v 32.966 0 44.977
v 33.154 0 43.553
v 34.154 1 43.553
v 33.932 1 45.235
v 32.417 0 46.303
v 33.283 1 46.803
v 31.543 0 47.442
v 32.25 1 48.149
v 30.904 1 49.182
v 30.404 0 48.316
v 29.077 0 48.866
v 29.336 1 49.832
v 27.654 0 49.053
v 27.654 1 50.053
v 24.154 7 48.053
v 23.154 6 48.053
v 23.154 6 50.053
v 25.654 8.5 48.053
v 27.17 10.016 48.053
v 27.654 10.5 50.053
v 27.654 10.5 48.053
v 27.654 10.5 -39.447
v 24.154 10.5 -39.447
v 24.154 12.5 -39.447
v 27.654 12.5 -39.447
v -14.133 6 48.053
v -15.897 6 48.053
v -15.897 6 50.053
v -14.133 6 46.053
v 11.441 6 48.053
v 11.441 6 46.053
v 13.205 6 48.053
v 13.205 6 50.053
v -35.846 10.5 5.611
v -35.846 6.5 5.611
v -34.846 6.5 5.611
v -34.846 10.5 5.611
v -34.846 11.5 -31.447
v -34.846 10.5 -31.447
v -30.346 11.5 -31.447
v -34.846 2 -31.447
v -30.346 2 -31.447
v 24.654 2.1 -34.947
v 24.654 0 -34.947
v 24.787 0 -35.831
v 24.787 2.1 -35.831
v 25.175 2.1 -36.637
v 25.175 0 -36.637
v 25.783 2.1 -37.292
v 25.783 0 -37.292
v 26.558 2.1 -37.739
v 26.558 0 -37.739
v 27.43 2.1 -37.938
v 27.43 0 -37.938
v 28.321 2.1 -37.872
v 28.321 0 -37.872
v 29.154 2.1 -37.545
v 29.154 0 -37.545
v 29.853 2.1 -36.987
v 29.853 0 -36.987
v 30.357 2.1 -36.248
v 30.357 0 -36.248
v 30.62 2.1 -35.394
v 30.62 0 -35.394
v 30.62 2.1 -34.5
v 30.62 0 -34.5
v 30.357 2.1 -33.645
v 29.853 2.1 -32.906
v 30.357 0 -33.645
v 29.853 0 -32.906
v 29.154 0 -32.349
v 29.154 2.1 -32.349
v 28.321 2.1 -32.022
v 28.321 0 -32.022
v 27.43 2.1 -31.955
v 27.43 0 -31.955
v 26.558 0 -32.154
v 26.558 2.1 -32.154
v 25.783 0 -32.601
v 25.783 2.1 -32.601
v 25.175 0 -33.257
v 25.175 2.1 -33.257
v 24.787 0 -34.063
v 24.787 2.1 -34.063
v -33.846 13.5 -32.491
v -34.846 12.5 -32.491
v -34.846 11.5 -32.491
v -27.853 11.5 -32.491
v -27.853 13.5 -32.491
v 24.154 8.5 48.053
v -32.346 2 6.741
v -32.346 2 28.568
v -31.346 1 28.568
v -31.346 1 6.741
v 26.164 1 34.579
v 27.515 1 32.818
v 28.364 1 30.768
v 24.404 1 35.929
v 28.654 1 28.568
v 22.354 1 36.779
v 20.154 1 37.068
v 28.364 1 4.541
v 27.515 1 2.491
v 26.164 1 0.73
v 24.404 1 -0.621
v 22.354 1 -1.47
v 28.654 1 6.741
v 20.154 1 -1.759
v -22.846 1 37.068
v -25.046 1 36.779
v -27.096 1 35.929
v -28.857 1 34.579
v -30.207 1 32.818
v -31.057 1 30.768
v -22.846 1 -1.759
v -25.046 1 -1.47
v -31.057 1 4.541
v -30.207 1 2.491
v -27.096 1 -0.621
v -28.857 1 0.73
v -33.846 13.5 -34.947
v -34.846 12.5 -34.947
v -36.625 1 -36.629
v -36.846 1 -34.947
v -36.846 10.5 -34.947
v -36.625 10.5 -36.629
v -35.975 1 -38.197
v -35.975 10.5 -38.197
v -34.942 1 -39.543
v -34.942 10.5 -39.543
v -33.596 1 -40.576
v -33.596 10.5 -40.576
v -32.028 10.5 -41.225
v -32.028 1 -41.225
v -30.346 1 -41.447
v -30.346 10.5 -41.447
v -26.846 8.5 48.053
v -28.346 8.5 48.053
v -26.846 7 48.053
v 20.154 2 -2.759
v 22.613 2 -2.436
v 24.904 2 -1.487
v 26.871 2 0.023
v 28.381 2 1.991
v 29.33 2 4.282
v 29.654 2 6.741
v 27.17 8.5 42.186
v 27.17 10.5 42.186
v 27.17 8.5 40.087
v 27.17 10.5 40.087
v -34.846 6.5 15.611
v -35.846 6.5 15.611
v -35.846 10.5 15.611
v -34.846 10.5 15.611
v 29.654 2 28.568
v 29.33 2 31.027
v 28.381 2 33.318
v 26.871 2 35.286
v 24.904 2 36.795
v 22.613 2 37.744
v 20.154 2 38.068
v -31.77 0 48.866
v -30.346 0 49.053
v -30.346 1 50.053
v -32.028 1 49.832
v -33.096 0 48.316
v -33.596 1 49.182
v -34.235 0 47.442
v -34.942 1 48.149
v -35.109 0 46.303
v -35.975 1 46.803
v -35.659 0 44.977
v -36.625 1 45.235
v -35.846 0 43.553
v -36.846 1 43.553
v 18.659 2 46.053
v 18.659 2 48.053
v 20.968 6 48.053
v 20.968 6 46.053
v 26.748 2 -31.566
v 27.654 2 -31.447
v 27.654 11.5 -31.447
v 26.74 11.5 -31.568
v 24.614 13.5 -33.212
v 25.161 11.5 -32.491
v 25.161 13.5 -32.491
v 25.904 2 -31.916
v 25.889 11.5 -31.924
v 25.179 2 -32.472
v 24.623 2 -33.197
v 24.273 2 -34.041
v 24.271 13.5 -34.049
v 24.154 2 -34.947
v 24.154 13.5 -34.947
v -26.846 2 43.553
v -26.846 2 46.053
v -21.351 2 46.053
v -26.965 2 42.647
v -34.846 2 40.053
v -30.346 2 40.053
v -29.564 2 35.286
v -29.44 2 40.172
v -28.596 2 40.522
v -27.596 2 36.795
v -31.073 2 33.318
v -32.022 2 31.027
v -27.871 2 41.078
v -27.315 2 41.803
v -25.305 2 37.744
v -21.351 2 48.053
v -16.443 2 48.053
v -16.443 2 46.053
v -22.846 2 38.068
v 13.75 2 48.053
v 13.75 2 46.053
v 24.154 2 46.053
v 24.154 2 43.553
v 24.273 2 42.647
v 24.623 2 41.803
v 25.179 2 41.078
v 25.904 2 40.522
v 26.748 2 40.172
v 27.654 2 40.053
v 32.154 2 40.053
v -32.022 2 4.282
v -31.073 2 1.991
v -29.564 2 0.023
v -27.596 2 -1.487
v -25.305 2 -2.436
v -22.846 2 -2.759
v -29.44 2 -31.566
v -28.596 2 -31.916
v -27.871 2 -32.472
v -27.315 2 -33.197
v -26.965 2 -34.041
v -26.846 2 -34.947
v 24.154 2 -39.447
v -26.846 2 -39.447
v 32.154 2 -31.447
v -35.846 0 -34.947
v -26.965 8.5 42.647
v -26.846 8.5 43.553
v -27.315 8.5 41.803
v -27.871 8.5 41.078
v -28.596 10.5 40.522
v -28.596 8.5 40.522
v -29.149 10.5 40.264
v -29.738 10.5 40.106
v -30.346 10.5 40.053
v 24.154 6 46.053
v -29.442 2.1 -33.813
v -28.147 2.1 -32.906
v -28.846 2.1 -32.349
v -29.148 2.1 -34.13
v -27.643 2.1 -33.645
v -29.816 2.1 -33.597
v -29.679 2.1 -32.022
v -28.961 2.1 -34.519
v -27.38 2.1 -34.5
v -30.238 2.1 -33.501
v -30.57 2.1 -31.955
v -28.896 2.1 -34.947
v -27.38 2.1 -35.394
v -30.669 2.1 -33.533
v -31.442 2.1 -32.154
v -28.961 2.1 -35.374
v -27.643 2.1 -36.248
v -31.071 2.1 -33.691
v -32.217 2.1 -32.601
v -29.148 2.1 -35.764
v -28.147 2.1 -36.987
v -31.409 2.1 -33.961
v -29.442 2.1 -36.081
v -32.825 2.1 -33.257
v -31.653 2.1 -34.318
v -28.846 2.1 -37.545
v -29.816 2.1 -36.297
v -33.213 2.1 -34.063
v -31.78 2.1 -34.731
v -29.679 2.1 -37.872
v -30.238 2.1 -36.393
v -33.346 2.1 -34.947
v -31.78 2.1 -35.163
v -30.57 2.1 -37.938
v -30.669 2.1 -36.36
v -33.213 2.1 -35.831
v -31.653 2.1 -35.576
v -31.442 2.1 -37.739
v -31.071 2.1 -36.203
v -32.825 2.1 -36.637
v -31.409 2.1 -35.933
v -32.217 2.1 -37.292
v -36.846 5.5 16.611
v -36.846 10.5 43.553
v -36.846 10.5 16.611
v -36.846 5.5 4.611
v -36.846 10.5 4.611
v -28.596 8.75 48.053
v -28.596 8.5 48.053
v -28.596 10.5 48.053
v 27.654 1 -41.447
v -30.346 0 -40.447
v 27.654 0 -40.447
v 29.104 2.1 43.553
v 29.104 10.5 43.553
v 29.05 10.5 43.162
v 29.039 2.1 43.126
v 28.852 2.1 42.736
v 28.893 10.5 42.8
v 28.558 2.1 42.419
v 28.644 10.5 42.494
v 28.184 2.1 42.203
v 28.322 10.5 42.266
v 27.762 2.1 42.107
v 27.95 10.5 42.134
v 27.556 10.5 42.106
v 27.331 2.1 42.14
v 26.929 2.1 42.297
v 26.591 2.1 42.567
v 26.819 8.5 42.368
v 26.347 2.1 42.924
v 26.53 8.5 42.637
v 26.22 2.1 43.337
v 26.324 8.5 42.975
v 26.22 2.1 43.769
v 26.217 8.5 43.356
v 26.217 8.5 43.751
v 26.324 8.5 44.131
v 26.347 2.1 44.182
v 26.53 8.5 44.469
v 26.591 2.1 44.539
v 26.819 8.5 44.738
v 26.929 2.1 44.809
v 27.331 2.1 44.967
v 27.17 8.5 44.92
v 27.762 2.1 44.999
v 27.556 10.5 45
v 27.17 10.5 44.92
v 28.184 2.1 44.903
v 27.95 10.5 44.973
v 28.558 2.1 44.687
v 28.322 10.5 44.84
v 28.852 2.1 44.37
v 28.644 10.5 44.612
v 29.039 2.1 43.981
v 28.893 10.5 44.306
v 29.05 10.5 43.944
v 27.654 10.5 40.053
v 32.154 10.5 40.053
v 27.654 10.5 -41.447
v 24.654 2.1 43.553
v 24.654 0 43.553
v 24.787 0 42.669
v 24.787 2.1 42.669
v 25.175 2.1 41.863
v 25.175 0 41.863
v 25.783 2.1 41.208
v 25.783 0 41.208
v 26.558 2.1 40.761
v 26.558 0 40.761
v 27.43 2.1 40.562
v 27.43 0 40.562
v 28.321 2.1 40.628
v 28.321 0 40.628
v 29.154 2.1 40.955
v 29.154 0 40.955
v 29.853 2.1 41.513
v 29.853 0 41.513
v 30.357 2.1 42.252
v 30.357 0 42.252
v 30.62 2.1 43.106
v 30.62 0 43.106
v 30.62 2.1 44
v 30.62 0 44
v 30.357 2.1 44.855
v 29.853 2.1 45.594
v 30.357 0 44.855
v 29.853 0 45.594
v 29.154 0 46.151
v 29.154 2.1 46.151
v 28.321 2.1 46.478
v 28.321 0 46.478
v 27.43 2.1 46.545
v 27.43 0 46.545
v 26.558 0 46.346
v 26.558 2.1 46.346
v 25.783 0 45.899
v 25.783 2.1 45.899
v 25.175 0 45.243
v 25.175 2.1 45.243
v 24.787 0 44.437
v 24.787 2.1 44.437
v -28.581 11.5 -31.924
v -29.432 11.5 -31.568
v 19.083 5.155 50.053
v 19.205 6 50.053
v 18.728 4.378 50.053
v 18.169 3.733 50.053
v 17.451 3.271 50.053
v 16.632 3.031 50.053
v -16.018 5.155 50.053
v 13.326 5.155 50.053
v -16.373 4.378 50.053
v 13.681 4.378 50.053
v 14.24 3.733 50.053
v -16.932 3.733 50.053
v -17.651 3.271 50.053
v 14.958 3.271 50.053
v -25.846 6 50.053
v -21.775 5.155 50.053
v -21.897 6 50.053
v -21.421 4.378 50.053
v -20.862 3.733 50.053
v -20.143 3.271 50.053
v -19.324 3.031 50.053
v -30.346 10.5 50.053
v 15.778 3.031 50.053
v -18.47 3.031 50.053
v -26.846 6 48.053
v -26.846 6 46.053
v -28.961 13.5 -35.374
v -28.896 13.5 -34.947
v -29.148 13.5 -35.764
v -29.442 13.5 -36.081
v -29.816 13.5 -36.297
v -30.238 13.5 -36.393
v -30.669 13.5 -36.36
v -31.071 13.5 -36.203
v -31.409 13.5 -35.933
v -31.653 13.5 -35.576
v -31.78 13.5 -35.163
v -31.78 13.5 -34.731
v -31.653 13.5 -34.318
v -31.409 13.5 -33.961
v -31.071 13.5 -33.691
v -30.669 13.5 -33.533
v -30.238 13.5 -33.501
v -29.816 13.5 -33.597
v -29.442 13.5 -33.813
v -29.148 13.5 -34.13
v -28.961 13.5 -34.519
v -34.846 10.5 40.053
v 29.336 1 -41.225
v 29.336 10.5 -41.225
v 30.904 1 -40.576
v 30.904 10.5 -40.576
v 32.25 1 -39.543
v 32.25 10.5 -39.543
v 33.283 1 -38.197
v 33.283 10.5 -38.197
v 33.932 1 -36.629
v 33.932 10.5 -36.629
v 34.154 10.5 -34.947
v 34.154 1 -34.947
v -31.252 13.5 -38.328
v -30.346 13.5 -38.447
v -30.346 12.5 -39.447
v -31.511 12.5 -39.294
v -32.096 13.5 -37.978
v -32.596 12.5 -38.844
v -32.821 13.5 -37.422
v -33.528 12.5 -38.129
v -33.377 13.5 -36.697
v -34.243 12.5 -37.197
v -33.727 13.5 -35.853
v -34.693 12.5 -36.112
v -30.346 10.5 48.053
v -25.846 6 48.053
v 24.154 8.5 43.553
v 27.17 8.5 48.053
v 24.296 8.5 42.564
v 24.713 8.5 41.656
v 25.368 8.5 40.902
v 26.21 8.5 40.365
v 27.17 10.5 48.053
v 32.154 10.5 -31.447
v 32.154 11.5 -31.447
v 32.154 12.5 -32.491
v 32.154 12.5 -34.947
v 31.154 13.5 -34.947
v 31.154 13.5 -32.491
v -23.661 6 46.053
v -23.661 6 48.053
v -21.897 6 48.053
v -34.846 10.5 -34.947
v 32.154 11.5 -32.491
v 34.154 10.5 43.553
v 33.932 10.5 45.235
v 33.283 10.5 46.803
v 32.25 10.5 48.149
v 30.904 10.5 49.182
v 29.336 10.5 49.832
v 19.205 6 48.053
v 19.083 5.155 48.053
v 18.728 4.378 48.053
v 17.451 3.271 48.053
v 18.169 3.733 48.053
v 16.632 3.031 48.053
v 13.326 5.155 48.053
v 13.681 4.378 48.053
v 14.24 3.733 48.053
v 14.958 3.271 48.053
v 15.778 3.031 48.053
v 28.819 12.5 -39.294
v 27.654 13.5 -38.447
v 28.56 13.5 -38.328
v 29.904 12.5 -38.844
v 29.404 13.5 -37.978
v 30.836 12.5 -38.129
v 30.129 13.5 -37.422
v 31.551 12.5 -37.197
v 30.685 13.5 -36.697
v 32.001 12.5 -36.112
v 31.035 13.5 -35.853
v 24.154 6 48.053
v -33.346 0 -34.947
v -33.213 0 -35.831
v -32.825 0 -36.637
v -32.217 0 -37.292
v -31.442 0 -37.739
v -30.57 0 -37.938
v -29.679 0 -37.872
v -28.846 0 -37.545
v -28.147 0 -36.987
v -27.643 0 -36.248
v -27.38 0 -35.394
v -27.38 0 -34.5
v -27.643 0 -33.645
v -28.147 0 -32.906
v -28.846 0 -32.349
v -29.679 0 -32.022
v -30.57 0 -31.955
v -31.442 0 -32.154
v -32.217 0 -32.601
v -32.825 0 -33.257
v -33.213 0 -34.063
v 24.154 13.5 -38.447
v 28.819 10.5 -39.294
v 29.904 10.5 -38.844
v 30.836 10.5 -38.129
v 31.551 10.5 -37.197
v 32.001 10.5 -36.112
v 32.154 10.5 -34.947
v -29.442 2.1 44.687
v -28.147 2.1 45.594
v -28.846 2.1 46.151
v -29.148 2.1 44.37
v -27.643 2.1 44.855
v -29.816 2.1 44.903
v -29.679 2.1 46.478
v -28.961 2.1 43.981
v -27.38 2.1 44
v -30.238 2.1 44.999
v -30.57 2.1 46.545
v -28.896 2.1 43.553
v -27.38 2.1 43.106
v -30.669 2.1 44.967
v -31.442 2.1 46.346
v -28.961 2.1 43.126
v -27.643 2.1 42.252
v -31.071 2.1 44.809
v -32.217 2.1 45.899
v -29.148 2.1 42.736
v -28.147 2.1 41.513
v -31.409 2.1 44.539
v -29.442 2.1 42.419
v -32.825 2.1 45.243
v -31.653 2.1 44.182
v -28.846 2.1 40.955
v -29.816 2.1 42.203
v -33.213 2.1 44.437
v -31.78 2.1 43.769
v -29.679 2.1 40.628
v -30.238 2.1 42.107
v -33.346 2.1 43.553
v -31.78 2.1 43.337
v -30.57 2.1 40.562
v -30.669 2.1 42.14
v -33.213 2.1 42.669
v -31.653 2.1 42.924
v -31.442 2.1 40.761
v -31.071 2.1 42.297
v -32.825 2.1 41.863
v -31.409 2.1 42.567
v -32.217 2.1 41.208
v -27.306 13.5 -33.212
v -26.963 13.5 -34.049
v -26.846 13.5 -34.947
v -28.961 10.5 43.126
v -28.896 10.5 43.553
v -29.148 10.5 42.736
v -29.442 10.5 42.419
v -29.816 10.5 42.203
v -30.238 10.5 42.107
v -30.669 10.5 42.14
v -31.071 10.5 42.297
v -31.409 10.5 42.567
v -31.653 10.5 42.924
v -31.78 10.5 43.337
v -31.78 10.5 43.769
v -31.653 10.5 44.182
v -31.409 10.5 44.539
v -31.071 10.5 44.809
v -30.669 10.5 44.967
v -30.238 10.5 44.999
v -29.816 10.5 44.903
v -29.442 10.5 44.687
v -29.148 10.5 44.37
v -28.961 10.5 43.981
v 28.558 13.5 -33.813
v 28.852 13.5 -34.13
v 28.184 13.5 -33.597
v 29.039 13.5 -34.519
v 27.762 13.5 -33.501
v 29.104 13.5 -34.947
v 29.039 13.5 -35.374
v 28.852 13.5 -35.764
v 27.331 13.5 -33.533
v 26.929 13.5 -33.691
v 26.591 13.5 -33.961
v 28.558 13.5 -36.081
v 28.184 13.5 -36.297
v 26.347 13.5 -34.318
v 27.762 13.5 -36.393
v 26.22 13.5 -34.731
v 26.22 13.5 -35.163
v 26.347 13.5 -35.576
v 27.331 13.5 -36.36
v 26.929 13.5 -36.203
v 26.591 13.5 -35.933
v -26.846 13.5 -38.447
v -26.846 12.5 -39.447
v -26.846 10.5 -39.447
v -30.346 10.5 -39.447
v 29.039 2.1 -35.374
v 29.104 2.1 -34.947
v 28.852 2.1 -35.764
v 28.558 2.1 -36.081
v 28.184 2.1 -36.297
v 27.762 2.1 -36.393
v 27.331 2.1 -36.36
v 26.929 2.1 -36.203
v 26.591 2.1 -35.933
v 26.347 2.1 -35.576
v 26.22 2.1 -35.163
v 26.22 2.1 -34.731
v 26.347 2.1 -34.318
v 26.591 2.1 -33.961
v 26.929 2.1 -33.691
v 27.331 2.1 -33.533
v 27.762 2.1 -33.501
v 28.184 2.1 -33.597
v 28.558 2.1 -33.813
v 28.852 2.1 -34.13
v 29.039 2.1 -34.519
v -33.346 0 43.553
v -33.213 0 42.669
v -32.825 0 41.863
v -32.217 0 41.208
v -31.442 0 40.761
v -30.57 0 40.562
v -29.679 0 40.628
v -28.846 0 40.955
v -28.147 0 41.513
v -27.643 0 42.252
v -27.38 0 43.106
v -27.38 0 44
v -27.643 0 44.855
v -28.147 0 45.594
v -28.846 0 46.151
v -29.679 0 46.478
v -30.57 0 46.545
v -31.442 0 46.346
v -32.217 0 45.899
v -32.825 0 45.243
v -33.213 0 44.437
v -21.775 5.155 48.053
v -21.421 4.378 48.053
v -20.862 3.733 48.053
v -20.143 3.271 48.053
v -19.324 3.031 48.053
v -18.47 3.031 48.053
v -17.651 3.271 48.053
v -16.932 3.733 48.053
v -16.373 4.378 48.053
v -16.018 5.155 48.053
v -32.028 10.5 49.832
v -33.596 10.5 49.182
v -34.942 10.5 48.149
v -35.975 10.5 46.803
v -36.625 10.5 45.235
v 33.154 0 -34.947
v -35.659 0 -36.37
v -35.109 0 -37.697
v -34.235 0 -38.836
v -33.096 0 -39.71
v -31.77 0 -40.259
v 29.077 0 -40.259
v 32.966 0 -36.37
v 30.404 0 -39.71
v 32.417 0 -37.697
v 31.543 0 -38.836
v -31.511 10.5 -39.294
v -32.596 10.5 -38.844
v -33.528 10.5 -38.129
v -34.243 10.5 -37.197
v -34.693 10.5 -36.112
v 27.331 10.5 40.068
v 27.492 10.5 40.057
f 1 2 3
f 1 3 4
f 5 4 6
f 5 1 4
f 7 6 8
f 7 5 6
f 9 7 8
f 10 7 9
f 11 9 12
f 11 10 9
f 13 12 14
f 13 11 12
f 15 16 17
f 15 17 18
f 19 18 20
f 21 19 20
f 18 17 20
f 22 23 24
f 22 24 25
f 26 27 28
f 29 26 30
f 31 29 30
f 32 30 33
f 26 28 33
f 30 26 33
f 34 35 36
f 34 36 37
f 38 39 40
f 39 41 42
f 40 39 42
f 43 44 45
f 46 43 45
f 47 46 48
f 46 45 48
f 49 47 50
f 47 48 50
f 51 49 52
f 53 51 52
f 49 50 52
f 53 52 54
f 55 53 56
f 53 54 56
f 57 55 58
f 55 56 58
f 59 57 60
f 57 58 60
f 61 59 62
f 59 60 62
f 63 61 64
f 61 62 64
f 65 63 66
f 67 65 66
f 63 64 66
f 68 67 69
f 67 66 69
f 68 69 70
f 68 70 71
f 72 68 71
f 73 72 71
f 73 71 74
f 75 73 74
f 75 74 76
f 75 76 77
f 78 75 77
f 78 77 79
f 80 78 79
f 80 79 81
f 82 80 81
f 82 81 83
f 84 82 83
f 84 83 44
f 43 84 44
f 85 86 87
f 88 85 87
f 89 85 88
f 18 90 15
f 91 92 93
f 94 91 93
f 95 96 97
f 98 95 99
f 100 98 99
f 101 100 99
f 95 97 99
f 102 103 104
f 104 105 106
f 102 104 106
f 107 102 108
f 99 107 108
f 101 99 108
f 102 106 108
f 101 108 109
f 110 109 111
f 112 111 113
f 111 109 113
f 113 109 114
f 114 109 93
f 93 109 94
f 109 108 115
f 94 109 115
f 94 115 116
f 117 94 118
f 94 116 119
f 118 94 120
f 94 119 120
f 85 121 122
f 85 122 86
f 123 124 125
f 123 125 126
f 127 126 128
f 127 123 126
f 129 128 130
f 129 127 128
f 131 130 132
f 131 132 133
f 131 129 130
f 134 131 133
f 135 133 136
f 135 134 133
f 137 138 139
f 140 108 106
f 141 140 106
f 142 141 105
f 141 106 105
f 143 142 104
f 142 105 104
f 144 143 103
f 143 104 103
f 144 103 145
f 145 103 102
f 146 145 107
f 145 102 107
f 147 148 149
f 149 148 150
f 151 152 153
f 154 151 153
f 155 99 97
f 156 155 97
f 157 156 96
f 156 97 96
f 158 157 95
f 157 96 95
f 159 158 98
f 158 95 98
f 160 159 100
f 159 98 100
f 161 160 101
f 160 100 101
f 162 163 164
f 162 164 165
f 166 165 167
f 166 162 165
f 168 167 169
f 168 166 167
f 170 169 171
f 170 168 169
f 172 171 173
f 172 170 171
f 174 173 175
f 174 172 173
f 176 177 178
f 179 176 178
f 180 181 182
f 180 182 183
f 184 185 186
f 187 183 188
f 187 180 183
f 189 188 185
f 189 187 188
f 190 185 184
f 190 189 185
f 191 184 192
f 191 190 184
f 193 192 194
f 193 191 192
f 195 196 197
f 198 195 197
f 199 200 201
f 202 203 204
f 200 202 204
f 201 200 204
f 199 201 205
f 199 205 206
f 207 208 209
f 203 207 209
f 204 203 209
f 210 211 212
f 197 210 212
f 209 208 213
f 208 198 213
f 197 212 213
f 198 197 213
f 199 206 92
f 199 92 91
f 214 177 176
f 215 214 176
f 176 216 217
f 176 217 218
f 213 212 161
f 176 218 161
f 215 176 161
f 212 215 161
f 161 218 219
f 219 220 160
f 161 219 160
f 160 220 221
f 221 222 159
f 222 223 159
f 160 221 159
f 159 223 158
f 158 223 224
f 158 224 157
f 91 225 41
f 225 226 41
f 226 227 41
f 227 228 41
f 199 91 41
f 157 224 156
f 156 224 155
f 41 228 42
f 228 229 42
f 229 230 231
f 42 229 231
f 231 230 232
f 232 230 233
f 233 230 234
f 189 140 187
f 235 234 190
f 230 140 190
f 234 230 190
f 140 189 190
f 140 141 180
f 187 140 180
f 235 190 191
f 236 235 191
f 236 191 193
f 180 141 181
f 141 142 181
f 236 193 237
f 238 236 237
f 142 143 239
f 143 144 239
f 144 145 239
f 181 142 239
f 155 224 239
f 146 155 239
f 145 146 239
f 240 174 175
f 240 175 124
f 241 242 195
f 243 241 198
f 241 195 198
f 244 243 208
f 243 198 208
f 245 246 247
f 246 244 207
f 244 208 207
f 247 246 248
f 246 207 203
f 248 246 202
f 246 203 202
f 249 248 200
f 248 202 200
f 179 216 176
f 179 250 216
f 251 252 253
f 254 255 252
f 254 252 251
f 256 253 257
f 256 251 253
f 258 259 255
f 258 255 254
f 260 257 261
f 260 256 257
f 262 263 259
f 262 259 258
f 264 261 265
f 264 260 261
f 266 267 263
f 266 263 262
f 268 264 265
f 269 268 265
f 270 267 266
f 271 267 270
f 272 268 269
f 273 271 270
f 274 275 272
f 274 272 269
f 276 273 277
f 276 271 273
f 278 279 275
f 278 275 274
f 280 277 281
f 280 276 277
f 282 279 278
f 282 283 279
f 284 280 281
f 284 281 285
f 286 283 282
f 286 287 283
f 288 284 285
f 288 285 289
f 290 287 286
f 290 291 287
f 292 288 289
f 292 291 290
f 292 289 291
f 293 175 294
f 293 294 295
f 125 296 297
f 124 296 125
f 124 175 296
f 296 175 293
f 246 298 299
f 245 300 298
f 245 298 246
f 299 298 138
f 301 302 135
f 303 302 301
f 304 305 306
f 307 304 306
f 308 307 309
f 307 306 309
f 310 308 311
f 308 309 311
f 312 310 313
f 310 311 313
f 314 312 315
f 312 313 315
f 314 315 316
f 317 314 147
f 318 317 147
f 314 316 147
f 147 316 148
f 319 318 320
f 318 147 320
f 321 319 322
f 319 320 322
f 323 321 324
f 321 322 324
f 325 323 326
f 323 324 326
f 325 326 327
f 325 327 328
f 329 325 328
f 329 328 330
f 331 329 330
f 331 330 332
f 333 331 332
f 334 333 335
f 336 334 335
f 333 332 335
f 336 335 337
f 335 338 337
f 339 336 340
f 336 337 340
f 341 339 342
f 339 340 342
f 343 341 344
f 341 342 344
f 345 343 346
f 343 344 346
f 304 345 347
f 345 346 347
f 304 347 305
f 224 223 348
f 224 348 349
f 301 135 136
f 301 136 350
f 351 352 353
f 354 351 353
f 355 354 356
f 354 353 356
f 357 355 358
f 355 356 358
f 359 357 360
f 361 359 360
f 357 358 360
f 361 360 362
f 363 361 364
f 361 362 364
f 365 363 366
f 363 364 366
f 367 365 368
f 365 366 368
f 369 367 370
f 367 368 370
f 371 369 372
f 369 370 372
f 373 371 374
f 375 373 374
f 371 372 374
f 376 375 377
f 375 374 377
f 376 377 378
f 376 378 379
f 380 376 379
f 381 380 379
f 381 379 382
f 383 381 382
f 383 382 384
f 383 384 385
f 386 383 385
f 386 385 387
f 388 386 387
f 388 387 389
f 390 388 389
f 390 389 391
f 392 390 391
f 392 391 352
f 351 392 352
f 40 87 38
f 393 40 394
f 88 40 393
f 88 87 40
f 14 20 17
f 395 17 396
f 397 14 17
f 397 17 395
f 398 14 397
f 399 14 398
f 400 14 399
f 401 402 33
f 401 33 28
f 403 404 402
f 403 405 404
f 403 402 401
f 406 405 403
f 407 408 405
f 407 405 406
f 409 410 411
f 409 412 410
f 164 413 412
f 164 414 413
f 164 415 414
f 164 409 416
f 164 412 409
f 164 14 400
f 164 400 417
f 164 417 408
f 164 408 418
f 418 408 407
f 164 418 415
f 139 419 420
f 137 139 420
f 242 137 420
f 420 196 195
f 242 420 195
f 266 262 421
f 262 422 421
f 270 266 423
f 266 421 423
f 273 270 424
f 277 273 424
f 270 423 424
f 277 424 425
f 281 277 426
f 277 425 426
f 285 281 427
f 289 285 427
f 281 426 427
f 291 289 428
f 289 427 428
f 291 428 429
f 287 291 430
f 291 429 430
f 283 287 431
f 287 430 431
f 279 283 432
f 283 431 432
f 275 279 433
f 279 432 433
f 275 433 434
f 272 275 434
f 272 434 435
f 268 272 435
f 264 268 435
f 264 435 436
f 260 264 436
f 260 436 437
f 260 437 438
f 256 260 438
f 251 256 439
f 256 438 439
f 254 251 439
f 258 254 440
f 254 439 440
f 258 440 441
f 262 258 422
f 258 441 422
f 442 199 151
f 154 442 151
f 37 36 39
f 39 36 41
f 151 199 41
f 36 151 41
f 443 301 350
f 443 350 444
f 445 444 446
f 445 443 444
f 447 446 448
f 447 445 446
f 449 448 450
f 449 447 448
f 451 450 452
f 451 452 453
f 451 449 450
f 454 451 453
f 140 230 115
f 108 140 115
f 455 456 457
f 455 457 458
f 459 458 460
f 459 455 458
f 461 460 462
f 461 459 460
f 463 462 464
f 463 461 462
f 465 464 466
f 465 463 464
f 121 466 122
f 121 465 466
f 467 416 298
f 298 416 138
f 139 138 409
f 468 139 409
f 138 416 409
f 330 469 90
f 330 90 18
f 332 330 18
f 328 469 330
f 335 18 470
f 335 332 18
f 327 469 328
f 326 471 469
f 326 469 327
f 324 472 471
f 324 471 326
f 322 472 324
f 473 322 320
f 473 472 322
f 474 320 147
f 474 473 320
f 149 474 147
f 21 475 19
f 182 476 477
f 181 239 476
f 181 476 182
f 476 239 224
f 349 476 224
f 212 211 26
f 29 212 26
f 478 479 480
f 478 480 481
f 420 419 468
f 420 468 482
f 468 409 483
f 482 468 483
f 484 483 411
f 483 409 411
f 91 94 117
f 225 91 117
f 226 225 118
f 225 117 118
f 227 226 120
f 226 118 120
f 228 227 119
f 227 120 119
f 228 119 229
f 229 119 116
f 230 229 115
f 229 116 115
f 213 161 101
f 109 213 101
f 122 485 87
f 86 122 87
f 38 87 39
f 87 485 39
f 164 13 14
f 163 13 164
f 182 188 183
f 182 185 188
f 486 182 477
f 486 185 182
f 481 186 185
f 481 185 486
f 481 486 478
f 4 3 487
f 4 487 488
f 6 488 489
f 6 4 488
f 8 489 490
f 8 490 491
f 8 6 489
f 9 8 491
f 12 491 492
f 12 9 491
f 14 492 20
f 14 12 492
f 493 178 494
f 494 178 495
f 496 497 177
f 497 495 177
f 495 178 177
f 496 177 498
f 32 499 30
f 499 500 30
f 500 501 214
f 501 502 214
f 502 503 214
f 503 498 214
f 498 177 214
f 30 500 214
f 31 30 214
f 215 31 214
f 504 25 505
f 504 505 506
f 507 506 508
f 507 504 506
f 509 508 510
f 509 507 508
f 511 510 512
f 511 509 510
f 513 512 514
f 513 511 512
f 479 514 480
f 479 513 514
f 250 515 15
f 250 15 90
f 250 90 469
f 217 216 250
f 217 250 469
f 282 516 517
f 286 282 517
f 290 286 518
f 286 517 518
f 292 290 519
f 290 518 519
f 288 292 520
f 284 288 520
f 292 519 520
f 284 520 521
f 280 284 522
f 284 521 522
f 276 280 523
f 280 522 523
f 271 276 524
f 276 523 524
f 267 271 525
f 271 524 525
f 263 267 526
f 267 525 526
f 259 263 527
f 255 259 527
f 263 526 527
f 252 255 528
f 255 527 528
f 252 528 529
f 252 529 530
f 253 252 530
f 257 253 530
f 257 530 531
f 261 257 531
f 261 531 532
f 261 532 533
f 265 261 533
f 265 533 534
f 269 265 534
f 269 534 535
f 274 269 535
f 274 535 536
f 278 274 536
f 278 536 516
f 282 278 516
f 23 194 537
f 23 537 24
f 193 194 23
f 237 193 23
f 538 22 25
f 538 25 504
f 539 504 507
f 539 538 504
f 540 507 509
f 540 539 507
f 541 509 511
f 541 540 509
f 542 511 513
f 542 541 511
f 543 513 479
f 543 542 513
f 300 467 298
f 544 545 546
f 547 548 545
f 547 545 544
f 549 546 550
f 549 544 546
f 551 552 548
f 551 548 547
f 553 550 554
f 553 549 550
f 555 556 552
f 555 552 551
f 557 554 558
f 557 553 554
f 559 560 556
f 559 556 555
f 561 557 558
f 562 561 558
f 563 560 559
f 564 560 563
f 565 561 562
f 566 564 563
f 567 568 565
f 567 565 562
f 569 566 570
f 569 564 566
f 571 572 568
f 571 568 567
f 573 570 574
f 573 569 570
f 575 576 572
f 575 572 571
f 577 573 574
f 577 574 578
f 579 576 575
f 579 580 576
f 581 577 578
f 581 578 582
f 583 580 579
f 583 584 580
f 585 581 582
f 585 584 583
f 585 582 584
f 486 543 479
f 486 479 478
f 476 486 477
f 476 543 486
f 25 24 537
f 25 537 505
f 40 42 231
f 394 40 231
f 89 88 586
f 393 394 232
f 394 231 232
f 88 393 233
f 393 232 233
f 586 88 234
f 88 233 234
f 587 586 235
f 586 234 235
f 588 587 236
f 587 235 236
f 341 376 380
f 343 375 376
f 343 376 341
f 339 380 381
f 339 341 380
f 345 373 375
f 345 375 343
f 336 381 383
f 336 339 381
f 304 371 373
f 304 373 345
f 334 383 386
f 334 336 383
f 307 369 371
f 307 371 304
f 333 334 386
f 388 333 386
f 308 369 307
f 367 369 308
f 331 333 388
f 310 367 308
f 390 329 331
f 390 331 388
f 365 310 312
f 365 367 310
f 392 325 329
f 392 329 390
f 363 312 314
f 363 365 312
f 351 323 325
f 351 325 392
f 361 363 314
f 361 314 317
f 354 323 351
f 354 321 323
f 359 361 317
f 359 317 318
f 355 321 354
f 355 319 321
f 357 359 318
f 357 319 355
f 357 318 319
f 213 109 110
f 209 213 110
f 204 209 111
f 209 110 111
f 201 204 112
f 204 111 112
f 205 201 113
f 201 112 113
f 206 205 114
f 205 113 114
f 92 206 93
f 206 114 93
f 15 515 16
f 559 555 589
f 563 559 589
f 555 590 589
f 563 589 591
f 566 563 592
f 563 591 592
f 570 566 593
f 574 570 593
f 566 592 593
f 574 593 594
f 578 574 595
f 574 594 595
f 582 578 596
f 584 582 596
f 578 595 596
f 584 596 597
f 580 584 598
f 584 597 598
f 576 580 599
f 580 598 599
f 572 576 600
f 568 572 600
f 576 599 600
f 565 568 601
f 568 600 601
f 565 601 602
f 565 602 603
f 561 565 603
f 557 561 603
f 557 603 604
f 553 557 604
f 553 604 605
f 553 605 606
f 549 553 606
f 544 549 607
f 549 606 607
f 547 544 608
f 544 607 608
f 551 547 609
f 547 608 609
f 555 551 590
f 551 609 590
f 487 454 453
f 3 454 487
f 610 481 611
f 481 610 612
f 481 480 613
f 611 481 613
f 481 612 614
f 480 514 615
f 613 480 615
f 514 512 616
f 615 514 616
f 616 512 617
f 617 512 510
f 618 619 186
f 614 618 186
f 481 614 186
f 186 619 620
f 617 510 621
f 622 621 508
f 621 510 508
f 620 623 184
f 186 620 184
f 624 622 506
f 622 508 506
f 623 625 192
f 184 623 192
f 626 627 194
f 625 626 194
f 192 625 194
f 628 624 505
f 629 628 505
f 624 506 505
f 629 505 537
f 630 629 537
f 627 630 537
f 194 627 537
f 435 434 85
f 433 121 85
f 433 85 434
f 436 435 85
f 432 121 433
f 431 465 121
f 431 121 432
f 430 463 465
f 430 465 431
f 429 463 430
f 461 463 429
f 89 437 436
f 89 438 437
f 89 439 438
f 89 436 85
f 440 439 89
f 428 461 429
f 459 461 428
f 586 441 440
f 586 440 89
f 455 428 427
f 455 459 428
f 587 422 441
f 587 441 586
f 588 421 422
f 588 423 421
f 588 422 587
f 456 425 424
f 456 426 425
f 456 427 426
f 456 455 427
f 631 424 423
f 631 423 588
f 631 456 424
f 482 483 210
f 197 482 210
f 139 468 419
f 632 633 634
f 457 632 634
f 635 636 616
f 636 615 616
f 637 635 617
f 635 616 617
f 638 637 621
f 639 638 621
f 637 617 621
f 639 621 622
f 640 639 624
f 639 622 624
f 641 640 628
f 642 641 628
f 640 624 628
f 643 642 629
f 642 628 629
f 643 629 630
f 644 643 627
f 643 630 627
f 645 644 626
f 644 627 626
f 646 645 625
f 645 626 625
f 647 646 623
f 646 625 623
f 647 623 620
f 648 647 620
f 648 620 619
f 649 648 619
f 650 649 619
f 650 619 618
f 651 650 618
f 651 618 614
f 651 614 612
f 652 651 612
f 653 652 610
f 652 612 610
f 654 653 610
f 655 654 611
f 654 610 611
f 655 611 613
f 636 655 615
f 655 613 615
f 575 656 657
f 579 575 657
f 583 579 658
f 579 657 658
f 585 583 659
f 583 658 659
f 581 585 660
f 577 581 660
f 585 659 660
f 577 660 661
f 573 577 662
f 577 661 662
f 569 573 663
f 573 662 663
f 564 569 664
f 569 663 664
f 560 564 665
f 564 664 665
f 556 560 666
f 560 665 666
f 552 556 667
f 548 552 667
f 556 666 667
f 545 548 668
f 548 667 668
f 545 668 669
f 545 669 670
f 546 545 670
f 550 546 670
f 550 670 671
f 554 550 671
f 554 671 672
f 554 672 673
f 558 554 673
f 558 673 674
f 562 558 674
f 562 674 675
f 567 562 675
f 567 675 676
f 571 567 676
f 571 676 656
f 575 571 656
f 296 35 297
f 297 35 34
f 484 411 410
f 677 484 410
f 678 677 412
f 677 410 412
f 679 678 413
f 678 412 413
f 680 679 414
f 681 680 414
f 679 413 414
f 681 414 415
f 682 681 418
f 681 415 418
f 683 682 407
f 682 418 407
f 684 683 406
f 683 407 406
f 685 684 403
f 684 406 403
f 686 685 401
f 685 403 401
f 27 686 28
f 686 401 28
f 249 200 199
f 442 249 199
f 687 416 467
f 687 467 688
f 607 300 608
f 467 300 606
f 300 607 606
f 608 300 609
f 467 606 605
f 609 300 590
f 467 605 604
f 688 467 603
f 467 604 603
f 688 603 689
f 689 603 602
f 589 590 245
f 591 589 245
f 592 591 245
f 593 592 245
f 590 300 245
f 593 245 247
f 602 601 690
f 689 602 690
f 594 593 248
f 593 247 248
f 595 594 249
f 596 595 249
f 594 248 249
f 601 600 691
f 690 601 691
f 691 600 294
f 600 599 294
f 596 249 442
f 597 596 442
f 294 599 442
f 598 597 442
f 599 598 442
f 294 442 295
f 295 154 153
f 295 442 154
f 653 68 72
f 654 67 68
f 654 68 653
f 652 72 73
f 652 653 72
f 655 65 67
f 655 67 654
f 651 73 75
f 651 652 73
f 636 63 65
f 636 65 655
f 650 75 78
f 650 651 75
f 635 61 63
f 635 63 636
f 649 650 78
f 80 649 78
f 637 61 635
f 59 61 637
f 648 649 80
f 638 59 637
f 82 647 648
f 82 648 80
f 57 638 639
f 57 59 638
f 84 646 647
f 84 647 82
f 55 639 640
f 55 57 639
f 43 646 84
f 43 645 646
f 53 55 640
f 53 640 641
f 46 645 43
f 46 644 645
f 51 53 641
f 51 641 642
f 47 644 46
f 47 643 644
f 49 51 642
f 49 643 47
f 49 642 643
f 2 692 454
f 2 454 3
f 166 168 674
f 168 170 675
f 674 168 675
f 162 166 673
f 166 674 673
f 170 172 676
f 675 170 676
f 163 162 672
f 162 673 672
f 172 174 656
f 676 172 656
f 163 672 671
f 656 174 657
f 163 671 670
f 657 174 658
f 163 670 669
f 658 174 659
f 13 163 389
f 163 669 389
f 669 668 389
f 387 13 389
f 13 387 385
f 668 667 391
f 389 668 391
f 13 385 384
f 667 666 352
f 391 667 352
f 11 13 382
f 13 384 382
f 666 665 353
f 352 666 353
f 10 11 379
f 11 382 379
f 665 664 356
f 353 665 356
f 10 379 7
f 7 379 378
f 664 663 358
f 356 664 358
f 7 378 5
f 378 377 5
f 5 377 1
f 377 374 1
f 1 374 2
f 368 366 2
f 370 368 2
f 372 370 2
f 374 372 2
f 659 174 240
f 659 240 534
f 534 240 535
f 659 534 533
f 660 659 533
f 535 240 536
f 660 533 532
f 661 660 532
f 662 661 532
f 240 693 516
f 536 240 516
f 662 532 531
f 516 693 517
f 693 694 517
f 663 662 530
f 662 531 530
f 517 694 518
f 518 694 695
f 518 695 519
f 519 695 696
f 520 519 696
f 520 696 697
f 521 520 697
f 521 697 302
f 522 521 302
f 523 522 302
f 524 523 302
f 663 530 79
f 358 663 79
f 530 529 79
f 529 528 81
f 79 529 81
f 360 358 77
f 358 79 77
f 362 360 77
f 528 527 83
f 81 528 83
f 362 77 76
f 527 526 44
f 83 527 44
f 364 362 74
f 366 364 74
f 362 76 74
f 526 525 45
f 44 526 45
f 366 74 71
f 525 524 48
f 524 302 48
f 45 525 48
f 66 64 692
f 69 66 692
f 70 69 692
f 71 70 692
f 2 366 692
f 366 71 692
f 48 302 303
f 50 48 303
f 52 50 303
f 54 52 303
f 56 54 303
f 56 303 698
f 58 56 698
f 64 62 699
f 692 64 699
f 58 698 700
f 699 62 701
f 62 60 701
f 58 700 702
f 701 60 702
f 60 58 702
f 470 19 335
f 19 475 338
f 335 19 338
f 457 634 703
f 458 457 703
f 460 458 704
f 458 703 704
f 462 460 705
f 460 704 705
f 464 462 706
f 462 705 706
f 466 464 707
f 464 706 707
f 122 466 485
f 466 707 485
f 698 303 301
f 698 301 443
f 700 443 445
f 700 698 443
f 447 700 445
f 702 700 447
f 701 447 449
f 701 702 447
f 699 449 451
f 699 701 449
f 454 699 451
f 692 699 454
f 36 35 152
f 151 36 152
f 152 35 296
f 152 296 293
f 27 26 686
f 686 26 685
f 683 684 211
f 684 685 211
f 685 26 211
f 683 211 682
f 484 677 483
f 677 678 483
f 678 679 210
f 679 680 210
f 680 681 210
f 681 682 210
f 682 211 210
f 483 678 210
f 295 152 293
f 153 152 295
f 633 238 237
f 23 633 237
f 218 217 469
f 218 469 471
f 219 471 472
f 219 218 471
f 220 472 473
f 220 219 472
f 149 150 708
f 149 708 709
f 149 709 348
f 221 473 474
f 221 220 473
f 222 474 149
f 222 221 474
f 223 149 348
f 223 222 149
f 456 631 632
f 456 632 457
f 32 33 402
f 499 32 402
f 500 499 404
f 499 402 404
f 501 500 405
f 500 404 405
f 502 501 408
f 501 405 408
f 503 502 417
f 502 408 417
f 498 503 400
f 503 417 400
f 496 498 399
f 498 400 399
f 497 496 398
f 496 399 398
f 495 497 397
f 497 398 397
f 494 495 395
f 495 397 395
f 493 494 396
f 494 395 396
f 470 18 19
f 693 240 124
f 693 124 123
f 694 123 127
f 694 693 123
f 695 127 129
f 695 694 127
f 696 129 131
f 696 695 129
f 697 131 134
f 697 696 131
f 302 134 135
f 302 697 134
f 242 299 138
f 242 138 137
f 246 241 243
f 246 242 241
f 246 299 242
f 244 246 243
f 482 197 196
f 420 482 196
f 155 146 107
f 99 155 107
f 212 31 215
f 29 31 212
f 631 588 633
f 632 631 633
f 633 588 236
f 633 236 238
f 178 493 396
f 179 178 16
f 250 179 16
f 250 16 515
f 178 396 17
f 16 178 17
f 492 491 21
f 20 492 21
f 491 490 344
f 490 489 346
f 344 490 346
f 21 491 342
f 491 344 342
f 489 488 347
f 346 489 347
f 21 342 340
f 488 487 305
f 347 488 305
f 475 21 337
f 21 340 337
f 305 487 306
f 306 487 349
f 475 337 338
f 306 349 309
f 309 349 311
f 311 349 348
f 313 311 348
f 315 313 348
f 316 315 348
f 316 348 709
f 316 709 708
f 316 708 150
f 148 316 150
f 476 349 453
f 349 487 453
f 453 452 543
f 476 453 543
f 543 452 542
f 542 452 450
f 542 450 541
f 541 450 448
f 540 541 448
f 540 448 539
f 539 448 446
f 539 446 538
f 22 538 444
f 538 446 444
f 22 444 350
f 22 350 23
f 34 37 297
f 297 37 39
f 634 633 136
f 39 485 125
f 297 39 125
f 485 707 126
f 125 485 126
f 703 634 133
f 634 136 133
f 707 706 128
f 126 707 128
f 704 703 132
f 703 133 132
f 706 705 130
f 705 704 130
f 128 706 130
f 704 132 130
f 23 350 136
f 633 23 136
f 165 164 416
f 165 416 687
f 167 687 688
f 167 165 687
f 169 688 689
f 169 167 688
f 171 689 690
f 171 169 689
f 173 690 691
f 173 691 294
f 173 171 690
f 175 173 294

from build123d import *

# Parameters (mm, degrees)
BOSS_EXTRUDE1_DEPTH                                = 10.5
BOSS_EXTRUDE2_DEPTH                                = 2
BOSS_EXTRUDE4_DEPTH                                = 11.5
BOSS_EXTRUDE6_DEPTH                                = 8.5
CUT_EXTRUDE1_DEPTH                                 = 2
CUT_EXTRUDE2_REACH                                 = 89.912
SKETCH9_W                                          = 10
SKETCH9_H                                          = 4
CHAMFER1_SIZE                                      = 1
CHAMFER2_SIZE                                      = 1
CBORE_FOR_M2_5_PAN_HEAD_MACHINE_SCREW1_D           = 2.9
CBORE_FOR_M2_5_PAN_HEAD_MACHINE_SCREW1_CBORE_D     = 6
CBORE_FOR_M2_5_PAN_HEAD_MACHINE_SCREW1_CBORE_DEPTH = 2.1
CBORE_FOR_M2_5_PAN_HEAD_MACHINE_SCREW2_D           = 2.9
CBORE_FOR_M2_5_PAN_HEAD_MACHINE_SCREW2_CBORE_D     = 6
CBORE_FOR_M2_5_PAN_HEAD_MACHINE_SCREW2_CBORE_DEPTH = 2.1
CBORE_FOR_M2_5_PAN_HEAD_MACHINE_SCREW3_D           = 2.9
CBORE_FOR_M2_5_PAN_HEAD_MACHINE_SCREW3_CBORE_D     = 6
CBORE_FOR_M2_5_PAN_HEAD_MACHINE_SCREW3_CBORE_DEPTH = 2.1
CBORE_FOR_M2_5_PAN_HEAD_MACHINE_SCREW4_D           = 2.9
CBORE_FOR_M2_5_PAN_HEAD_MACHINE_SCREW4_CBORE_D     = 6
CBORE_FOR_M2_5_PAN_HEAD_MACHINE_SCREW4_CBORE_DEPTH = 2.1
SKETCH18_W                                         = 55.765913406
SKETCH18_H                                         = 7.966361229
CUT_EXTRUDE3_DEPTH                                 = 2
BOSS_EXTRUDE7_DEPTH                                = 2
SKETCH21_W                                         = 67
SKETCH21_H                                         = 1.043656047
CUT_EXTRUDE4_DEPTH                                 = 2
CUT_EXTRUDE5_DEPTH                                 = 1
CHAMFER4_SIZE                                      = 1.5
CHAMFER5_SIZE                                      = 1
CHAMFER6_SIZE                                      = 1


with BuildPart() as part:
    # Sketch2 → Boss-Extrude1 (new body)
    with BuildSketch(Plane(origin=(0, 0, 0), x_dir=(1, 0, 0), z_dir=(0, 1, 0))):
        with BuildLine():
            Line((-30.346153846, 41.446848386), (27.653846154, 41.446848386))
            ThreePointArc((27.653846154, 41.446848386), (32.250040232, 39.543042463), (34.153846154, 34.946848386))
            Line((34.153846154, 34.946848386), (34.153846154, -43.553151614))
            ThreePointArc((34.153846154, -43.553151614), (32.250040232, -48.149345692), (27.653846154, -50.053151614))
            Line((27.653846154, -50.053151614), (-30.346153846, -50.053151614))
            ThreePointArc((-30.346153846, -50.053151614), (-34.942347924, -48.149345692), (-36.846153846, -43.553151614))
            Line((-36.846153846, -43.553151614), (-36.846153846, 34.946848386))
            ThreePointArc((-36.846153846, 34.946848386), (-34.942347924, 39.543042463), (-30.346153846, 41.446848386))
        make_face()
        with BuildLine():
            Line((-30.346153846, 39.446848386), (27.653846154, 39.446848386))
            ThreePointArc((27.653846154, 39.446848386), (30.835826669, 38.128828901), (32.153846154, 34.946848386))
            Line((32.153846154, 34.946848386), (32.153846154, -43.553151614))
            ThreePointArc((32.153846154, -43.553151614), (30.835826669, -46.73513213), (27.653846154, -48.053151614))
            Line((27.653846154, -48.053151614), (-30.346153846, -48.053151614))
            ThreePointArc((-30.346153846, -48.053151614), (-33.528134361, -46.73513213), (-34.846153846, -43.553151614))
            Line((-34.846153846, -43.553151614), (-34.846153846, 34.946848386))
            ThreePointArc((-34.846153846, 34.946848386), (-33.528134361, 38.128828901), (-30.346153846, 39.446848386))
        make_face(mode=Mode.SUBTRACT)
    extrude(amount=BOSS_EXTRUDE1_DEPTH)

    # Sketch3 → Boss-Extrude2 (add)
    with BuildSketch(Plane(origin=(0, 0, 0), x_dir=(1, 0, 0), z_dir=(0, 1, 0))):
        with BuildLine():
            Line((-30.346153846, -48.053151614), (27.653846154, -48.053151614))
            ThreePointArc((27.653846154, -48.053151614), (30.835826669, -46.73513213), (32.153846154, -43.553151614))
            Line((32.153846154, -43.553151614), (32.153846154, 34.946848386))
            ThreePointArc((32.153846154, 34.946848386), (30.835826669, 38.128828901), (27.653846154, 39.446848386))
            Line((27.653846154, 39.446848386), (-30.346153846, 39.446848386))
            ThreePointArc((-30.346153846, 39.446848386), (-33.528134361, 38.128828901), (-34.846153846, 34.946848386))
            Line((-34.846153846, 34.946848386), (-34.846153846, -43.553151614))
            ThreePointArc((-34.846153846, -43.553151614), (-33.528134361, -46.73513213), (-30.346153846, -48.053151614))
        make_face()
    extrude(amount=BOSS_EXTRUDE2_DEPTH)

    # Sketch6 → Boss-Extrude4 (add)
    with BuildSketch(Plane(origin=(0, 2, 0), x_dir=(1, 0, 0), z_dir=(0, 1, 0))):
        with BuildLine():
            Line((-26.846153846, 34.946848386), (-26.846153846, 39.446848386))
            Line((-26.846153846, 39.446848386), (-30.346153846, 39.446848386))
            ThreePointArc((-30.346153846, 39.446848386), (-33.528134361, 38.128828901), (-34.846153846, 34.946848386))
            Line((-34.846153846, 34.946848386), (-34.846153846, 31.446848386))
            Line((-34.846153846, 31.446848386), (-30.346153846, 31.446848386))
            ThreePointArc((-30.346153846, 31.446848386), (-27.871280112, 32.471974652), (-26.846153846, 34.946848386))
        make_face()
        with BuildLine():
            Line((24.153846154, 34.946848386), (24.153846154, 39.446848386))
            Line((24.153846154, 39.446848386), (27.653846154, 39.446848386))
            ThreePointArc((27.653846154, 39.446848386), (30.835826669, 38.128828901), (32.153846154, 34.946848386))
            Line((32.153846154, 34.946848386), (32.153846154, 31.446848386))
            Line((32.153846154, 31.446848386), (27.653846154, 31.446848386))
            ThreePointArc((27.653846154, 31.446848386), (25.17897242, 32.471974652), (24.153846154, 34.946848386))
        make_face()
    extrude(amount=BOSS_EXTRUDE4_DEPTH)

    # Sketch8 → Boss-Extrude6 (add)
    with BuildSketch(Plane(origin=(0, 2, 0), x_dir=(1, 0, 0), z_dir=(0, 1, 0))):
        with BuildLine():
            Line((32.153846154, -40.053151614), (32.153846154, -43.553151614))
            ThreePointArc((32.153846154, -43.553151614), (30.835826669, -46.73513213), (27.653846154, -48.053151614))
            Line((27.653846154, -48.053151614), (24.153846154, -48.053151614))
            Line((24.153846154, -48.053151614), (24.153846154, -43.553151614))
            ThreePointArc((24.153846154, -43.553151614), (25.17897242, -41.07827788), (27.653846154, -40.053151614))
            Line((27.653846154, -40.053151614), (32.153846154, -40.053151614))
        make_face()
        with BuildLine():
            Line((-34.846153846, -40.053151614), (-34.846153846, -43.553151614))
            ThreePointArc((-34.846153846, -43.553151614), (-33.528134361, -46.73513213), (-30.346153846, -48.053151614))
            Line((-30.346153846, -48.053151614), (-26.846153846, -48.053151614))
            Line((-26.846153846, -48.053151614), (-26.846153846, -43.553151614))
            ThreePointArc((-26.846153846, -43.553151614), (-27.871280112, -41.07827788), (-30.346153846, -40.053151614))
            Line((-30.346153846, -40.053151614), (-34.846153846, -40.053151614))
        make_face()
    extrude(amount=BOSS_EXTRUDE6_DEPTH)

    # Sketch7 → Cut-Extrude1 (cut)
    with BuildSketch(Plane.XY.offset(50.053151614)):
        with BuildLine():
            Line((27.653846154, 10.5), (-30.346153846, 10.5))
            Line((-30.346153846, 10.5), (-25.846153846, 6))
            Line((-25.846153846, 6), (-21.89693017, 6))
            ThreePointArc((-21.89693017, 6), (-18.89693017, 3), (-15.89693017, 6))
            Line((-15.89693017, 6), (13.204622477, 6))
            ThreePointArc((13.204622477, 6), (16.204622477, 3), (19.204622477, 6))
            Line((19.204622477, 6), (23.153846154, 6))
            Line((23.153846154, 6), (27.653846154, 10.5))
        make_face()
    extrude(amount=-CUT_EXTRUDE1_DEPTH, mode=Mode.SUBTRACT)

    # Sketch9 → Cut-Extrude2 (cut, up to next)
    with BuildSketch(Plane.ZY.offset(36.846153846), mode=Mode.PRIVATE) as cut_extrude2_sk1:
        with Locations((10.611298715, 8.5)):
            Rectangle(SKETCH9_W, SKETCH9_H)
    cut_extrude2_tool1 = extrude(cut_extrude2_sk1.sketch, amount=-CUT_EXTRUDE2_REACH, mode=Mode.PRIVATE) & part.part
    add(cut_extrude2_tool1.solids().sort_by_distance((-36.846154, 8.5, 10.611299))[0], mode=Mode.SUBTRACT)

    # Chamfer1
    chamfer1_edges = [part.edges().sort_by_distance(p)[0] for p in [
        (-36.846153846, 8.5, 5.611298715),
        (-36.846153846, 6.5, 10.611298715),
        (-36.846153846, 8.5, 15.611298715),
    ]]
    chamfer(chamfer1_edges, length=CHAMFER1_SIZE)

    # Chamfer2
    chamfer2_edges = [part.edges().sort_by_distance(p)[0] for p in [
        (-36.846153846, 0, 4.303151614),
        (-34.942347924, 0, -39.543042463),
        (-1.346153846, 0, -41.446848386),
        (32.250040232, 0, -39.543042463),
        (34.153846154, 0, 4.303151614),
        (32.250040232, 0, 48.149345692),
        (-1.346153846, 0, 50.053151614),
        (-34.942347924, 0, 48.149345692),
    ]]
    chamfer(chamfer2_edges, length=CHAMFER2_SIZE)

    # CBORE for M2.5 Pan Head Machine Screw1 (through all)
    with Locations(Plane(origin=(0, 0, 0), x_dir=(-1, 0, 0), z_dir=(0, -1, 0))):
        with Locations((-27.653846154, 34.946848386)):
            CounterBoreHole(CBORE_FOR_M2_5_PAN_HEAD_MACHINE_SCREW1_D / 2, CBORE_FOR_M2_5_PAN_HEAD_MACHINE_SCREW1_CBORE_D / 2, CBORE_FOR_M2_5_PAN_HEAD_MACHINE_SCREW1_CBORE_DEPTH)

    # CBORE for M2.5 Pan Head Machine Screw2 (through all)
    with Locations(Plane(origin=(0, 0, 0), x_dir=(-1, 0, 0), z_dir=(0, -1, 0))):
        with Locations((30.346153846, 34.946848386)):
            CounterBoreHole(CBORE_FOR_M2_5_PAN_HEAD_MACHINE_SCREW2_D / 2, CBORE_FOR_M2_5_PAN_HEAD_MACHINE_SCREW2_CBORE_D / 2, CBORE_FOR_M2_5_PAN_HEAD_MACHINE_SCREW2_CBORE_DEPTH)

    # CBORE for M2.5 Pan Head Machine Screw3 (through all)
    with Locations(Plane(origin=(0, 0, 0), x_dir=(-1, 0, 0), z_dir=(0, -1, 0))):
        with Locations((-27.653846154, -43.553151614)):
            CounterBoreHole(CBORE_FOR_M2_5_PAN_HEAD_MACHINE_SCREW3_D / 2, CBORE_FOR_M2_5_PAN_HEAD_MACHINE_SCREW3_CBORE_D / 2, CBORE_FOR_M2_5_PAN_HEAD_MACHINE_SCREW3_CBORE_DEPTH)

    # CBORE for M2.5 Pan Head Machine Screw4 (through all)
    with Locations(Plane(origin=(0, 0, 0), x_dir=(-1, 0, 0), z_dir=(0, -1, 0))):
        with Locations((30.346153846, -43.553151614)):
            CounterBoreHole(CBORE_FOR_M2_5_PAN_HEAD_MACHINE_SCREW4_D / 2, CBORE_FOR_M2_5_PAN_HEAD_MACHINE_SCREW4_CBORE_D / 2, CBORE_FOR_M2_5_PAN_HEAD_MACHINE_SCREW4_CBORE_DEPTH)

    # Sketch18 → Cut-Extrude3 (cut)
    with BuildSketch(Plane(origin=(0, 10.5, 0), x_dir=(1, 0, 0), z_dir=(0, 1, 0))):
        with Locations((-0.713197143, -44.069971)):
            Rectangle(SKETCH18_W, SKETCH18_H)
    extrude(amount=-CUT_EXTRUDE3_DEPTH, mode=Mode.SUBTRACT)

    # Sketch19 → Boss-Extrude7 (add)
    with BuildSketch(Plane(origin=(0, 0, 48.053151614), x_dir=(-1, 0, 0), z_dir=(0, 0, -1))):
        Polygon((-24.153846154, 2), (-18.659026224, 2), (-20.968427301, 6), (-21.953470486, 6), (-23.153846154, 6), (-24.153846154, 6), align=None)
        Polygon((-13.750218731, 2), (16.442526423, 2), (14.133125347, 6), (13.148082161, 6), (-10.455774469, 6), (-11.440817654, 6), align=None)
        Polygon((25.846153846, 6), (24.645778179, 6), (23.660734993, 6), (21.351333916, 2), (26.846153846, 2), (26.846153846, 6), align=None)
    extrude(amount=BOSS_EXTRUDE7_DEPTH)

    # Sketch21 → Cut-Extrude4 (cut)
    with BuildSketch(Plane(origin=(0, 13.5, 0), x_dir=(1, 0, 0), z_dir=(0, 1, 0))):
        with Locations((-1.346153846, 31.96867641)):
            Rectangle(SKETCH21_W, SKETCH21_H)
    extrude(amount=-CUT_EXTRUDE4_DEPTH, mode=Mode.SUBTRACT)

    # Sketch22 → Cut-Extrude5 (cut)
    with BuildSketch(Plane(origin=(0, 2, 0), x_dir=(1, 0, 0), z_dir=(0, 1, 0))):
        with BuildLine():
            Line((-22.846153846, 3.259423313), (20.153846154, 3.259423313))
            ThreePointArc((20.153846154, 3.259423313), (27.224913966, 0.330491125), (30.153846154, -6.740576687))
            Line((30.153846154, -6.740576687), (30.153846154, -28.568151594))
            ThreePointArc((30.153846154, -28.568151594), (27.224913966, -35.639219406), (20.153846154, -38.568151594))
            Line((20.153846154, -38.568151594), (-22.846153846, -38.568151594))
            ThreePointArc((-22.846153846, -38.568151594), (-29.917221658, -35.639219406), (-32.846153846, -28.568151594))
            Line((-32.846153846, -28.568151594), (-32.846153846, -6.740576687))
            ThreePointArc((-32.846153846, -6.740576687), (-29.917221658, 0.330491125), (-22.846153846, 3.259423313))
        make_face()
    extrude(amount=-CUT_EXTRUDE5_DEPTH, mode=Mode.SUBTRACT)

    # Chamfer4
    # the kernel refuses this chamfer: 1.5 mm, written as the material it adds along each edge
    with BuildSketch(Plane(origin=(20.153846154, 1, 38.568151594), x_dir=(0, 0.9996219169112968, 0.027495876610586775), z_dir=(-1, 0, 0))) as chamfer4_piece_1_section:
        Polygon((CHAMFER4_SIZE * 0.999621916911, CHAMFER4_SIZE * 0.0274958766106), (-CHAMFER4_SIZE * 0.0274958766106, CHAMFER4_SIZE * 0.999621916911), (0, 0), align=None)
    chamfer4_piece_1 = extrude(amount=43, mode=Mode.PRIVATE)
    chamfer4_piece_1 = split(chamfer4_piece_1, bisect_by=Plane(origin=(-1.346153846, 2, 38.022106092), z_dir=(0, -1, 0)), keep=Keep.TOP, mode=Mode.PRIVATE)
    add(chamfer4_piece_1)
    with BuildSketch(Plane(origin=(20.153846154, 1, 28.568151594), x_dir=(1, 0, 0), z_dir=(0, 0, -1))) as chamfer4_piece_2_section:
        Polygon((10, -CHAMFER4_SIZE), (10 - CHAMFER4_SIZE, 0), (10, 0), align=None)
    chamfer4_piece_2 = revolve(axis=Axis((20.153846154, 1, 28.568151594), (0, -1, 0)), revolution_arc=90, mode=Mode.PRIVATE)
    chamfer4_piece_2 = split(chamfer4_piece_2, bisect_by=Plane(origin=(26.515435334, 2, 34.929740774), z_dir=(0, -1, 0)), keep=Keep.TOP, mode=Mode.PRIVATE)
    add(chamfer4_piece_2)
    with BuildSketch(Plane(origin=(-22.846153846, 1, 28.568151594), x_dir=(0, 0, 1), z_dir=(1, 0, 0))) as chamfer4_piece_3_section:
        Polygon((10, -CHAMFER4_SIZE), (10 - CHAMFER4_SIZE, 0), (10, 0), align=None)
    chamfer4_piece_3 = revolve(axis=Axis((-22.846153846, 1, 28.568151594), (0, -1, 0)), revolution_arc=90, mode=Mode.PRIVATE)
    chamfer4_piece_3 = split(chamfer4_piece_3, bisect_by=Plane(origin=(-29.207743026, 2, 34.929740774), z_dir=(0, -1, 0)), keep=Keep.TOP, mode=Mode.PRIVATE)
    add(chamfer4_piece_3)
    with BuildSketch(Plane(origin=(30.153846154, 1, 6.740576687), x_dir=(0.027495876610586775, 0.9996219169112968, 0), z_dir=(0, 0, 1))) as chamfer4_piece_4_section:
        Polygon((CHAMFER4_SIZE * 0.999621916911, CHAMFER4_SIZE * 0.0274958766106), (-CHAMFER4_SIZE * 0.0274958766106, CHAMFER4_SIZE * 0.999621916911), (0, 0), align=None)
    chamfer4_piece_4 = extrude(amount=21.827574907, mode=Mode.PRIVATE)
    chamfer4_piece_4 = split(chamfer4_piece_4, bisect_by=Plane(origin=(29.607800651, 2, 17.654364141), z_dir=(0, -1, 0)), keep=Keep.TOP, mode=Mode.PRIVATE)
    add(chamfer4_piece_4)
    with BuildSketch(Plane(origin=(-32.846153846, 1, 28.568151594), x_dir=(-0.027495876610586775, 0.9996219169112968, 0), z_dir=(0, 0, -1))) as chamfer4_piece_5_section:
        Polygon((CHAMFER4_SIZE * 0.999621916911, CHAMFER4_SIZE * 0.0274958766106), (-CHAMFER4_SIZE * 0.0274958766106, CHAMFER4_SIZE * 0.999621916911), (0, 0), align=None)
    chamfer4_piece_5 = extrude(amount=21.827574907, mode=Mode.PRIVATE)
    chamfer4_piece_5 = split(chamfer4_piece_5, bisect_by=Plane(origin=(-32.300108344, 2, 17.654364141), z_dir=(0, -1, 0)), keep=Keep.TOP, mode=Mode.PRIVATE)
    add(chamfer4_piece_5)
    with BuildSketch(Plane(origin=(20.153846154, 1, 6.740576687), x_dir=(0, 0, -1), z_dir=(-1, 0, 0))) as chamfer4_piece_6_section:
        Polygon((10, -CHAMFER4_SIZE), (10 - CHAMFER4_SIZE, 0), (10, 0), align=None)
    chamfer4_piece_6 = revolve(axis=Axis((20.153846154, 1, 6.740576687), (0, -1, 0)), revolution_arc=90, mode=Mode.PRIVATE)
    chamfer4_piece_6 = split(chamfer4_piece_6, bisect_by=Plane(origin=(26.515435334, 2, 0.378987507), z_dir=(0, -1, 0)), keep=Keep.TOP, mode=Mode.PRIVATE)
    add(chamfer4_piece_6)
    with BuildSketch(Plane(origin=(-22.846153846, 1, 6.740576687), x_dir=(-1, 0, 0), z_dir=(0, 0, 1))) as chamfer4_piece_7_section:
        Polygon((10, -CHAMFER4_SIZE), (10 - CHAMFER4_SIZE, 0), (10, 0), align=None)
    chamfer4_piece_7 = revolve(axis=Axis((-22.846153846, 1, 6.740576687), (0, -1, 0)), revolution_arc=90, mode=Mode.PRIVATE)
    chamfer4_piece_7 = split(chamfer4_piece_7, bisect_by=Plane(origin=(-29.207743026, 2, 0.378987507), z_dir=(0, -1, 0)), keep=Keep.TOP, mode=Mode.PRIVATE)
    add(chamfer4_piece_7)
    with BuildSketch(Plane(origin=(-22.846153846, 1, -3.259423313), x_dir=(0, 0.9996219169112969, -0.02749587661058649), z_dir=(1, 0, 0))) as chamfer4_piece_8_section:
        Polygon((CHAMFER4_SIZE * 0.999621916911, CHAMFER4_SIZE * 0.0274958766106), (-CHAMFER4_SIZE * 0.0274958766106, CHAMFER4_SIZE * 0.999621916911), (0, 0), align=None)
    chamfer4_piece_8 = extrude(amount=43, mode=Mode.PRIVATE)
    chamfer4_piece_8 = split(chamfer4_piece_8, bisect_by=Plane(origin=(-1.346153846, 2, -2.713377811), z_dir=(0, -1, 0)), keep=Keep.TOP, mode=Mode.PRIVATE)
    add(chamfer4_piece_8)

    # Chamfer5
    chamfer5_edges = [part.edges().sort_by_distance(p)[0] for p in [
        (32.153846154, 13.5, -33.718676409),
        (30.835826669, 13.5, -38.128828901),
        (25.903846154, 13.5, -39.446848386),
    ]]
    chamfer(chamfer5_edges, length=CHAMFER5_SIZE)

    # Chamfer6
    chamfer6_edges = [part.edges().sort_by_distance(p)[0] for p in [
        (-28.596153846, 13.5, -39.446848386),
        (-33.528134361, 13.5, -38.128828901),
        (-34.846153846, 13.5, -33.718676409),
    ]]
    chamfer(chamfer6_edges, length=CHAMFER6_SIZE)


solid = part.part
